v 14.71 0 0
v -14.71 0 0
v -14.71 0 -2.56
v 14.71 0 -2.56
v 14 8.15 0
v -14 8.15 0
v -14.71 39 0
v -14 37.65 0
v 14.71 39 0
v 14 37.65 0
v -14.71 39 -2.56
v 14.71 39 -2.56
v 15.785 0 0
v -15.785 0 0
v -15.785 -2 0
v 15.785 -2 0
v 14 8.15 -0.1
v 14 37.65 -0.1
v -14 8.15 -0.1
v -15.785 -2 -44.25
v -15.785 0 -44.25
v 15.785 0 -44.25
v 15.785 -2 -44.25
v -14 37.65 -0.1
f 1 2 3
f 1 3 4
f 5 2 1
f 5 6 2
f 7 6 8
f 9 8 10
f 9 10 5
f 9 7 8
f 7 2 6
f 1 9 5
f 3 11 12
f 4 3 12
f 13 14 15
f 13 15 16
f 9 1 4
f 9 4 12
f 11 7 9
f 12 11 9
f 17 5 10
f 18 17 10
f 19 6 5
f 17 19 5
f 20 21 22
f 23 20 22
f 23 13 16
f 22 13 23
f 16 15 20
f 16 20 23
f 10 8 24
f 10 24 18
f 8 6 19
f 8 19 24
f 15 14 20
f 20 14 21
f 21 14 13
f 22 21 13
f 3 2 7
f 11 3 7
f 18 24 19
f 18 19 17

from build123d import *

# Parameters (mm, degrees)
SKETCH1_W           = 31.57
SKETCH1_H           = 44.25
BOSS_EXTRUDE1_DEPTH = 2
SKETCH2_W           = 29.42
SKETCH2_H           = 39
BOSS_EXTRUDE2_DEPTH = 2.56
SKETCH3_W           = 28
SKETCH3_H           = 29.5
CUT_EXTRUDE1_DEPTH  = 0.1


with BuildPart() as part:
    # Sketch1 → Boss-Extrude1 (new body)
    with BuildSketch(Plane(origin=(0, 0, 0), x_dir=(1, 0, 0), z_dir=(0, 1, 0))):
        with Locations((0, 22.125)):
            Rectangle(SKETCH1_W, SKETCH1_H)
    extrude(amount=-BOSS_EXTRUDE1_DEPTH)


with BuildPart() as body_2:
    # Sketch2 → Boss-Extrude2 (new body)
    with BuildSketch(Plane.XY):
        with Locations((0, 19.5)):
            Rectangle(SKETCH2_W, SKETCH2_H)
    extrude(amount=-BOSS_EXTRUDE2_DEPTH)

    # Sketch3 → Cut-Extrude1 (cut)
    with BuildSketch(Plane.XY):
        with Locations((0, 22.9)):
            Rectangle(SKETCH3_W, SKETCH3_H)
    extrude(amount=-CUT_EXTRUDE1_DEPTH, mode=Mode.SUBTRACT)


solid = Compound([part.part, body_2.part])
